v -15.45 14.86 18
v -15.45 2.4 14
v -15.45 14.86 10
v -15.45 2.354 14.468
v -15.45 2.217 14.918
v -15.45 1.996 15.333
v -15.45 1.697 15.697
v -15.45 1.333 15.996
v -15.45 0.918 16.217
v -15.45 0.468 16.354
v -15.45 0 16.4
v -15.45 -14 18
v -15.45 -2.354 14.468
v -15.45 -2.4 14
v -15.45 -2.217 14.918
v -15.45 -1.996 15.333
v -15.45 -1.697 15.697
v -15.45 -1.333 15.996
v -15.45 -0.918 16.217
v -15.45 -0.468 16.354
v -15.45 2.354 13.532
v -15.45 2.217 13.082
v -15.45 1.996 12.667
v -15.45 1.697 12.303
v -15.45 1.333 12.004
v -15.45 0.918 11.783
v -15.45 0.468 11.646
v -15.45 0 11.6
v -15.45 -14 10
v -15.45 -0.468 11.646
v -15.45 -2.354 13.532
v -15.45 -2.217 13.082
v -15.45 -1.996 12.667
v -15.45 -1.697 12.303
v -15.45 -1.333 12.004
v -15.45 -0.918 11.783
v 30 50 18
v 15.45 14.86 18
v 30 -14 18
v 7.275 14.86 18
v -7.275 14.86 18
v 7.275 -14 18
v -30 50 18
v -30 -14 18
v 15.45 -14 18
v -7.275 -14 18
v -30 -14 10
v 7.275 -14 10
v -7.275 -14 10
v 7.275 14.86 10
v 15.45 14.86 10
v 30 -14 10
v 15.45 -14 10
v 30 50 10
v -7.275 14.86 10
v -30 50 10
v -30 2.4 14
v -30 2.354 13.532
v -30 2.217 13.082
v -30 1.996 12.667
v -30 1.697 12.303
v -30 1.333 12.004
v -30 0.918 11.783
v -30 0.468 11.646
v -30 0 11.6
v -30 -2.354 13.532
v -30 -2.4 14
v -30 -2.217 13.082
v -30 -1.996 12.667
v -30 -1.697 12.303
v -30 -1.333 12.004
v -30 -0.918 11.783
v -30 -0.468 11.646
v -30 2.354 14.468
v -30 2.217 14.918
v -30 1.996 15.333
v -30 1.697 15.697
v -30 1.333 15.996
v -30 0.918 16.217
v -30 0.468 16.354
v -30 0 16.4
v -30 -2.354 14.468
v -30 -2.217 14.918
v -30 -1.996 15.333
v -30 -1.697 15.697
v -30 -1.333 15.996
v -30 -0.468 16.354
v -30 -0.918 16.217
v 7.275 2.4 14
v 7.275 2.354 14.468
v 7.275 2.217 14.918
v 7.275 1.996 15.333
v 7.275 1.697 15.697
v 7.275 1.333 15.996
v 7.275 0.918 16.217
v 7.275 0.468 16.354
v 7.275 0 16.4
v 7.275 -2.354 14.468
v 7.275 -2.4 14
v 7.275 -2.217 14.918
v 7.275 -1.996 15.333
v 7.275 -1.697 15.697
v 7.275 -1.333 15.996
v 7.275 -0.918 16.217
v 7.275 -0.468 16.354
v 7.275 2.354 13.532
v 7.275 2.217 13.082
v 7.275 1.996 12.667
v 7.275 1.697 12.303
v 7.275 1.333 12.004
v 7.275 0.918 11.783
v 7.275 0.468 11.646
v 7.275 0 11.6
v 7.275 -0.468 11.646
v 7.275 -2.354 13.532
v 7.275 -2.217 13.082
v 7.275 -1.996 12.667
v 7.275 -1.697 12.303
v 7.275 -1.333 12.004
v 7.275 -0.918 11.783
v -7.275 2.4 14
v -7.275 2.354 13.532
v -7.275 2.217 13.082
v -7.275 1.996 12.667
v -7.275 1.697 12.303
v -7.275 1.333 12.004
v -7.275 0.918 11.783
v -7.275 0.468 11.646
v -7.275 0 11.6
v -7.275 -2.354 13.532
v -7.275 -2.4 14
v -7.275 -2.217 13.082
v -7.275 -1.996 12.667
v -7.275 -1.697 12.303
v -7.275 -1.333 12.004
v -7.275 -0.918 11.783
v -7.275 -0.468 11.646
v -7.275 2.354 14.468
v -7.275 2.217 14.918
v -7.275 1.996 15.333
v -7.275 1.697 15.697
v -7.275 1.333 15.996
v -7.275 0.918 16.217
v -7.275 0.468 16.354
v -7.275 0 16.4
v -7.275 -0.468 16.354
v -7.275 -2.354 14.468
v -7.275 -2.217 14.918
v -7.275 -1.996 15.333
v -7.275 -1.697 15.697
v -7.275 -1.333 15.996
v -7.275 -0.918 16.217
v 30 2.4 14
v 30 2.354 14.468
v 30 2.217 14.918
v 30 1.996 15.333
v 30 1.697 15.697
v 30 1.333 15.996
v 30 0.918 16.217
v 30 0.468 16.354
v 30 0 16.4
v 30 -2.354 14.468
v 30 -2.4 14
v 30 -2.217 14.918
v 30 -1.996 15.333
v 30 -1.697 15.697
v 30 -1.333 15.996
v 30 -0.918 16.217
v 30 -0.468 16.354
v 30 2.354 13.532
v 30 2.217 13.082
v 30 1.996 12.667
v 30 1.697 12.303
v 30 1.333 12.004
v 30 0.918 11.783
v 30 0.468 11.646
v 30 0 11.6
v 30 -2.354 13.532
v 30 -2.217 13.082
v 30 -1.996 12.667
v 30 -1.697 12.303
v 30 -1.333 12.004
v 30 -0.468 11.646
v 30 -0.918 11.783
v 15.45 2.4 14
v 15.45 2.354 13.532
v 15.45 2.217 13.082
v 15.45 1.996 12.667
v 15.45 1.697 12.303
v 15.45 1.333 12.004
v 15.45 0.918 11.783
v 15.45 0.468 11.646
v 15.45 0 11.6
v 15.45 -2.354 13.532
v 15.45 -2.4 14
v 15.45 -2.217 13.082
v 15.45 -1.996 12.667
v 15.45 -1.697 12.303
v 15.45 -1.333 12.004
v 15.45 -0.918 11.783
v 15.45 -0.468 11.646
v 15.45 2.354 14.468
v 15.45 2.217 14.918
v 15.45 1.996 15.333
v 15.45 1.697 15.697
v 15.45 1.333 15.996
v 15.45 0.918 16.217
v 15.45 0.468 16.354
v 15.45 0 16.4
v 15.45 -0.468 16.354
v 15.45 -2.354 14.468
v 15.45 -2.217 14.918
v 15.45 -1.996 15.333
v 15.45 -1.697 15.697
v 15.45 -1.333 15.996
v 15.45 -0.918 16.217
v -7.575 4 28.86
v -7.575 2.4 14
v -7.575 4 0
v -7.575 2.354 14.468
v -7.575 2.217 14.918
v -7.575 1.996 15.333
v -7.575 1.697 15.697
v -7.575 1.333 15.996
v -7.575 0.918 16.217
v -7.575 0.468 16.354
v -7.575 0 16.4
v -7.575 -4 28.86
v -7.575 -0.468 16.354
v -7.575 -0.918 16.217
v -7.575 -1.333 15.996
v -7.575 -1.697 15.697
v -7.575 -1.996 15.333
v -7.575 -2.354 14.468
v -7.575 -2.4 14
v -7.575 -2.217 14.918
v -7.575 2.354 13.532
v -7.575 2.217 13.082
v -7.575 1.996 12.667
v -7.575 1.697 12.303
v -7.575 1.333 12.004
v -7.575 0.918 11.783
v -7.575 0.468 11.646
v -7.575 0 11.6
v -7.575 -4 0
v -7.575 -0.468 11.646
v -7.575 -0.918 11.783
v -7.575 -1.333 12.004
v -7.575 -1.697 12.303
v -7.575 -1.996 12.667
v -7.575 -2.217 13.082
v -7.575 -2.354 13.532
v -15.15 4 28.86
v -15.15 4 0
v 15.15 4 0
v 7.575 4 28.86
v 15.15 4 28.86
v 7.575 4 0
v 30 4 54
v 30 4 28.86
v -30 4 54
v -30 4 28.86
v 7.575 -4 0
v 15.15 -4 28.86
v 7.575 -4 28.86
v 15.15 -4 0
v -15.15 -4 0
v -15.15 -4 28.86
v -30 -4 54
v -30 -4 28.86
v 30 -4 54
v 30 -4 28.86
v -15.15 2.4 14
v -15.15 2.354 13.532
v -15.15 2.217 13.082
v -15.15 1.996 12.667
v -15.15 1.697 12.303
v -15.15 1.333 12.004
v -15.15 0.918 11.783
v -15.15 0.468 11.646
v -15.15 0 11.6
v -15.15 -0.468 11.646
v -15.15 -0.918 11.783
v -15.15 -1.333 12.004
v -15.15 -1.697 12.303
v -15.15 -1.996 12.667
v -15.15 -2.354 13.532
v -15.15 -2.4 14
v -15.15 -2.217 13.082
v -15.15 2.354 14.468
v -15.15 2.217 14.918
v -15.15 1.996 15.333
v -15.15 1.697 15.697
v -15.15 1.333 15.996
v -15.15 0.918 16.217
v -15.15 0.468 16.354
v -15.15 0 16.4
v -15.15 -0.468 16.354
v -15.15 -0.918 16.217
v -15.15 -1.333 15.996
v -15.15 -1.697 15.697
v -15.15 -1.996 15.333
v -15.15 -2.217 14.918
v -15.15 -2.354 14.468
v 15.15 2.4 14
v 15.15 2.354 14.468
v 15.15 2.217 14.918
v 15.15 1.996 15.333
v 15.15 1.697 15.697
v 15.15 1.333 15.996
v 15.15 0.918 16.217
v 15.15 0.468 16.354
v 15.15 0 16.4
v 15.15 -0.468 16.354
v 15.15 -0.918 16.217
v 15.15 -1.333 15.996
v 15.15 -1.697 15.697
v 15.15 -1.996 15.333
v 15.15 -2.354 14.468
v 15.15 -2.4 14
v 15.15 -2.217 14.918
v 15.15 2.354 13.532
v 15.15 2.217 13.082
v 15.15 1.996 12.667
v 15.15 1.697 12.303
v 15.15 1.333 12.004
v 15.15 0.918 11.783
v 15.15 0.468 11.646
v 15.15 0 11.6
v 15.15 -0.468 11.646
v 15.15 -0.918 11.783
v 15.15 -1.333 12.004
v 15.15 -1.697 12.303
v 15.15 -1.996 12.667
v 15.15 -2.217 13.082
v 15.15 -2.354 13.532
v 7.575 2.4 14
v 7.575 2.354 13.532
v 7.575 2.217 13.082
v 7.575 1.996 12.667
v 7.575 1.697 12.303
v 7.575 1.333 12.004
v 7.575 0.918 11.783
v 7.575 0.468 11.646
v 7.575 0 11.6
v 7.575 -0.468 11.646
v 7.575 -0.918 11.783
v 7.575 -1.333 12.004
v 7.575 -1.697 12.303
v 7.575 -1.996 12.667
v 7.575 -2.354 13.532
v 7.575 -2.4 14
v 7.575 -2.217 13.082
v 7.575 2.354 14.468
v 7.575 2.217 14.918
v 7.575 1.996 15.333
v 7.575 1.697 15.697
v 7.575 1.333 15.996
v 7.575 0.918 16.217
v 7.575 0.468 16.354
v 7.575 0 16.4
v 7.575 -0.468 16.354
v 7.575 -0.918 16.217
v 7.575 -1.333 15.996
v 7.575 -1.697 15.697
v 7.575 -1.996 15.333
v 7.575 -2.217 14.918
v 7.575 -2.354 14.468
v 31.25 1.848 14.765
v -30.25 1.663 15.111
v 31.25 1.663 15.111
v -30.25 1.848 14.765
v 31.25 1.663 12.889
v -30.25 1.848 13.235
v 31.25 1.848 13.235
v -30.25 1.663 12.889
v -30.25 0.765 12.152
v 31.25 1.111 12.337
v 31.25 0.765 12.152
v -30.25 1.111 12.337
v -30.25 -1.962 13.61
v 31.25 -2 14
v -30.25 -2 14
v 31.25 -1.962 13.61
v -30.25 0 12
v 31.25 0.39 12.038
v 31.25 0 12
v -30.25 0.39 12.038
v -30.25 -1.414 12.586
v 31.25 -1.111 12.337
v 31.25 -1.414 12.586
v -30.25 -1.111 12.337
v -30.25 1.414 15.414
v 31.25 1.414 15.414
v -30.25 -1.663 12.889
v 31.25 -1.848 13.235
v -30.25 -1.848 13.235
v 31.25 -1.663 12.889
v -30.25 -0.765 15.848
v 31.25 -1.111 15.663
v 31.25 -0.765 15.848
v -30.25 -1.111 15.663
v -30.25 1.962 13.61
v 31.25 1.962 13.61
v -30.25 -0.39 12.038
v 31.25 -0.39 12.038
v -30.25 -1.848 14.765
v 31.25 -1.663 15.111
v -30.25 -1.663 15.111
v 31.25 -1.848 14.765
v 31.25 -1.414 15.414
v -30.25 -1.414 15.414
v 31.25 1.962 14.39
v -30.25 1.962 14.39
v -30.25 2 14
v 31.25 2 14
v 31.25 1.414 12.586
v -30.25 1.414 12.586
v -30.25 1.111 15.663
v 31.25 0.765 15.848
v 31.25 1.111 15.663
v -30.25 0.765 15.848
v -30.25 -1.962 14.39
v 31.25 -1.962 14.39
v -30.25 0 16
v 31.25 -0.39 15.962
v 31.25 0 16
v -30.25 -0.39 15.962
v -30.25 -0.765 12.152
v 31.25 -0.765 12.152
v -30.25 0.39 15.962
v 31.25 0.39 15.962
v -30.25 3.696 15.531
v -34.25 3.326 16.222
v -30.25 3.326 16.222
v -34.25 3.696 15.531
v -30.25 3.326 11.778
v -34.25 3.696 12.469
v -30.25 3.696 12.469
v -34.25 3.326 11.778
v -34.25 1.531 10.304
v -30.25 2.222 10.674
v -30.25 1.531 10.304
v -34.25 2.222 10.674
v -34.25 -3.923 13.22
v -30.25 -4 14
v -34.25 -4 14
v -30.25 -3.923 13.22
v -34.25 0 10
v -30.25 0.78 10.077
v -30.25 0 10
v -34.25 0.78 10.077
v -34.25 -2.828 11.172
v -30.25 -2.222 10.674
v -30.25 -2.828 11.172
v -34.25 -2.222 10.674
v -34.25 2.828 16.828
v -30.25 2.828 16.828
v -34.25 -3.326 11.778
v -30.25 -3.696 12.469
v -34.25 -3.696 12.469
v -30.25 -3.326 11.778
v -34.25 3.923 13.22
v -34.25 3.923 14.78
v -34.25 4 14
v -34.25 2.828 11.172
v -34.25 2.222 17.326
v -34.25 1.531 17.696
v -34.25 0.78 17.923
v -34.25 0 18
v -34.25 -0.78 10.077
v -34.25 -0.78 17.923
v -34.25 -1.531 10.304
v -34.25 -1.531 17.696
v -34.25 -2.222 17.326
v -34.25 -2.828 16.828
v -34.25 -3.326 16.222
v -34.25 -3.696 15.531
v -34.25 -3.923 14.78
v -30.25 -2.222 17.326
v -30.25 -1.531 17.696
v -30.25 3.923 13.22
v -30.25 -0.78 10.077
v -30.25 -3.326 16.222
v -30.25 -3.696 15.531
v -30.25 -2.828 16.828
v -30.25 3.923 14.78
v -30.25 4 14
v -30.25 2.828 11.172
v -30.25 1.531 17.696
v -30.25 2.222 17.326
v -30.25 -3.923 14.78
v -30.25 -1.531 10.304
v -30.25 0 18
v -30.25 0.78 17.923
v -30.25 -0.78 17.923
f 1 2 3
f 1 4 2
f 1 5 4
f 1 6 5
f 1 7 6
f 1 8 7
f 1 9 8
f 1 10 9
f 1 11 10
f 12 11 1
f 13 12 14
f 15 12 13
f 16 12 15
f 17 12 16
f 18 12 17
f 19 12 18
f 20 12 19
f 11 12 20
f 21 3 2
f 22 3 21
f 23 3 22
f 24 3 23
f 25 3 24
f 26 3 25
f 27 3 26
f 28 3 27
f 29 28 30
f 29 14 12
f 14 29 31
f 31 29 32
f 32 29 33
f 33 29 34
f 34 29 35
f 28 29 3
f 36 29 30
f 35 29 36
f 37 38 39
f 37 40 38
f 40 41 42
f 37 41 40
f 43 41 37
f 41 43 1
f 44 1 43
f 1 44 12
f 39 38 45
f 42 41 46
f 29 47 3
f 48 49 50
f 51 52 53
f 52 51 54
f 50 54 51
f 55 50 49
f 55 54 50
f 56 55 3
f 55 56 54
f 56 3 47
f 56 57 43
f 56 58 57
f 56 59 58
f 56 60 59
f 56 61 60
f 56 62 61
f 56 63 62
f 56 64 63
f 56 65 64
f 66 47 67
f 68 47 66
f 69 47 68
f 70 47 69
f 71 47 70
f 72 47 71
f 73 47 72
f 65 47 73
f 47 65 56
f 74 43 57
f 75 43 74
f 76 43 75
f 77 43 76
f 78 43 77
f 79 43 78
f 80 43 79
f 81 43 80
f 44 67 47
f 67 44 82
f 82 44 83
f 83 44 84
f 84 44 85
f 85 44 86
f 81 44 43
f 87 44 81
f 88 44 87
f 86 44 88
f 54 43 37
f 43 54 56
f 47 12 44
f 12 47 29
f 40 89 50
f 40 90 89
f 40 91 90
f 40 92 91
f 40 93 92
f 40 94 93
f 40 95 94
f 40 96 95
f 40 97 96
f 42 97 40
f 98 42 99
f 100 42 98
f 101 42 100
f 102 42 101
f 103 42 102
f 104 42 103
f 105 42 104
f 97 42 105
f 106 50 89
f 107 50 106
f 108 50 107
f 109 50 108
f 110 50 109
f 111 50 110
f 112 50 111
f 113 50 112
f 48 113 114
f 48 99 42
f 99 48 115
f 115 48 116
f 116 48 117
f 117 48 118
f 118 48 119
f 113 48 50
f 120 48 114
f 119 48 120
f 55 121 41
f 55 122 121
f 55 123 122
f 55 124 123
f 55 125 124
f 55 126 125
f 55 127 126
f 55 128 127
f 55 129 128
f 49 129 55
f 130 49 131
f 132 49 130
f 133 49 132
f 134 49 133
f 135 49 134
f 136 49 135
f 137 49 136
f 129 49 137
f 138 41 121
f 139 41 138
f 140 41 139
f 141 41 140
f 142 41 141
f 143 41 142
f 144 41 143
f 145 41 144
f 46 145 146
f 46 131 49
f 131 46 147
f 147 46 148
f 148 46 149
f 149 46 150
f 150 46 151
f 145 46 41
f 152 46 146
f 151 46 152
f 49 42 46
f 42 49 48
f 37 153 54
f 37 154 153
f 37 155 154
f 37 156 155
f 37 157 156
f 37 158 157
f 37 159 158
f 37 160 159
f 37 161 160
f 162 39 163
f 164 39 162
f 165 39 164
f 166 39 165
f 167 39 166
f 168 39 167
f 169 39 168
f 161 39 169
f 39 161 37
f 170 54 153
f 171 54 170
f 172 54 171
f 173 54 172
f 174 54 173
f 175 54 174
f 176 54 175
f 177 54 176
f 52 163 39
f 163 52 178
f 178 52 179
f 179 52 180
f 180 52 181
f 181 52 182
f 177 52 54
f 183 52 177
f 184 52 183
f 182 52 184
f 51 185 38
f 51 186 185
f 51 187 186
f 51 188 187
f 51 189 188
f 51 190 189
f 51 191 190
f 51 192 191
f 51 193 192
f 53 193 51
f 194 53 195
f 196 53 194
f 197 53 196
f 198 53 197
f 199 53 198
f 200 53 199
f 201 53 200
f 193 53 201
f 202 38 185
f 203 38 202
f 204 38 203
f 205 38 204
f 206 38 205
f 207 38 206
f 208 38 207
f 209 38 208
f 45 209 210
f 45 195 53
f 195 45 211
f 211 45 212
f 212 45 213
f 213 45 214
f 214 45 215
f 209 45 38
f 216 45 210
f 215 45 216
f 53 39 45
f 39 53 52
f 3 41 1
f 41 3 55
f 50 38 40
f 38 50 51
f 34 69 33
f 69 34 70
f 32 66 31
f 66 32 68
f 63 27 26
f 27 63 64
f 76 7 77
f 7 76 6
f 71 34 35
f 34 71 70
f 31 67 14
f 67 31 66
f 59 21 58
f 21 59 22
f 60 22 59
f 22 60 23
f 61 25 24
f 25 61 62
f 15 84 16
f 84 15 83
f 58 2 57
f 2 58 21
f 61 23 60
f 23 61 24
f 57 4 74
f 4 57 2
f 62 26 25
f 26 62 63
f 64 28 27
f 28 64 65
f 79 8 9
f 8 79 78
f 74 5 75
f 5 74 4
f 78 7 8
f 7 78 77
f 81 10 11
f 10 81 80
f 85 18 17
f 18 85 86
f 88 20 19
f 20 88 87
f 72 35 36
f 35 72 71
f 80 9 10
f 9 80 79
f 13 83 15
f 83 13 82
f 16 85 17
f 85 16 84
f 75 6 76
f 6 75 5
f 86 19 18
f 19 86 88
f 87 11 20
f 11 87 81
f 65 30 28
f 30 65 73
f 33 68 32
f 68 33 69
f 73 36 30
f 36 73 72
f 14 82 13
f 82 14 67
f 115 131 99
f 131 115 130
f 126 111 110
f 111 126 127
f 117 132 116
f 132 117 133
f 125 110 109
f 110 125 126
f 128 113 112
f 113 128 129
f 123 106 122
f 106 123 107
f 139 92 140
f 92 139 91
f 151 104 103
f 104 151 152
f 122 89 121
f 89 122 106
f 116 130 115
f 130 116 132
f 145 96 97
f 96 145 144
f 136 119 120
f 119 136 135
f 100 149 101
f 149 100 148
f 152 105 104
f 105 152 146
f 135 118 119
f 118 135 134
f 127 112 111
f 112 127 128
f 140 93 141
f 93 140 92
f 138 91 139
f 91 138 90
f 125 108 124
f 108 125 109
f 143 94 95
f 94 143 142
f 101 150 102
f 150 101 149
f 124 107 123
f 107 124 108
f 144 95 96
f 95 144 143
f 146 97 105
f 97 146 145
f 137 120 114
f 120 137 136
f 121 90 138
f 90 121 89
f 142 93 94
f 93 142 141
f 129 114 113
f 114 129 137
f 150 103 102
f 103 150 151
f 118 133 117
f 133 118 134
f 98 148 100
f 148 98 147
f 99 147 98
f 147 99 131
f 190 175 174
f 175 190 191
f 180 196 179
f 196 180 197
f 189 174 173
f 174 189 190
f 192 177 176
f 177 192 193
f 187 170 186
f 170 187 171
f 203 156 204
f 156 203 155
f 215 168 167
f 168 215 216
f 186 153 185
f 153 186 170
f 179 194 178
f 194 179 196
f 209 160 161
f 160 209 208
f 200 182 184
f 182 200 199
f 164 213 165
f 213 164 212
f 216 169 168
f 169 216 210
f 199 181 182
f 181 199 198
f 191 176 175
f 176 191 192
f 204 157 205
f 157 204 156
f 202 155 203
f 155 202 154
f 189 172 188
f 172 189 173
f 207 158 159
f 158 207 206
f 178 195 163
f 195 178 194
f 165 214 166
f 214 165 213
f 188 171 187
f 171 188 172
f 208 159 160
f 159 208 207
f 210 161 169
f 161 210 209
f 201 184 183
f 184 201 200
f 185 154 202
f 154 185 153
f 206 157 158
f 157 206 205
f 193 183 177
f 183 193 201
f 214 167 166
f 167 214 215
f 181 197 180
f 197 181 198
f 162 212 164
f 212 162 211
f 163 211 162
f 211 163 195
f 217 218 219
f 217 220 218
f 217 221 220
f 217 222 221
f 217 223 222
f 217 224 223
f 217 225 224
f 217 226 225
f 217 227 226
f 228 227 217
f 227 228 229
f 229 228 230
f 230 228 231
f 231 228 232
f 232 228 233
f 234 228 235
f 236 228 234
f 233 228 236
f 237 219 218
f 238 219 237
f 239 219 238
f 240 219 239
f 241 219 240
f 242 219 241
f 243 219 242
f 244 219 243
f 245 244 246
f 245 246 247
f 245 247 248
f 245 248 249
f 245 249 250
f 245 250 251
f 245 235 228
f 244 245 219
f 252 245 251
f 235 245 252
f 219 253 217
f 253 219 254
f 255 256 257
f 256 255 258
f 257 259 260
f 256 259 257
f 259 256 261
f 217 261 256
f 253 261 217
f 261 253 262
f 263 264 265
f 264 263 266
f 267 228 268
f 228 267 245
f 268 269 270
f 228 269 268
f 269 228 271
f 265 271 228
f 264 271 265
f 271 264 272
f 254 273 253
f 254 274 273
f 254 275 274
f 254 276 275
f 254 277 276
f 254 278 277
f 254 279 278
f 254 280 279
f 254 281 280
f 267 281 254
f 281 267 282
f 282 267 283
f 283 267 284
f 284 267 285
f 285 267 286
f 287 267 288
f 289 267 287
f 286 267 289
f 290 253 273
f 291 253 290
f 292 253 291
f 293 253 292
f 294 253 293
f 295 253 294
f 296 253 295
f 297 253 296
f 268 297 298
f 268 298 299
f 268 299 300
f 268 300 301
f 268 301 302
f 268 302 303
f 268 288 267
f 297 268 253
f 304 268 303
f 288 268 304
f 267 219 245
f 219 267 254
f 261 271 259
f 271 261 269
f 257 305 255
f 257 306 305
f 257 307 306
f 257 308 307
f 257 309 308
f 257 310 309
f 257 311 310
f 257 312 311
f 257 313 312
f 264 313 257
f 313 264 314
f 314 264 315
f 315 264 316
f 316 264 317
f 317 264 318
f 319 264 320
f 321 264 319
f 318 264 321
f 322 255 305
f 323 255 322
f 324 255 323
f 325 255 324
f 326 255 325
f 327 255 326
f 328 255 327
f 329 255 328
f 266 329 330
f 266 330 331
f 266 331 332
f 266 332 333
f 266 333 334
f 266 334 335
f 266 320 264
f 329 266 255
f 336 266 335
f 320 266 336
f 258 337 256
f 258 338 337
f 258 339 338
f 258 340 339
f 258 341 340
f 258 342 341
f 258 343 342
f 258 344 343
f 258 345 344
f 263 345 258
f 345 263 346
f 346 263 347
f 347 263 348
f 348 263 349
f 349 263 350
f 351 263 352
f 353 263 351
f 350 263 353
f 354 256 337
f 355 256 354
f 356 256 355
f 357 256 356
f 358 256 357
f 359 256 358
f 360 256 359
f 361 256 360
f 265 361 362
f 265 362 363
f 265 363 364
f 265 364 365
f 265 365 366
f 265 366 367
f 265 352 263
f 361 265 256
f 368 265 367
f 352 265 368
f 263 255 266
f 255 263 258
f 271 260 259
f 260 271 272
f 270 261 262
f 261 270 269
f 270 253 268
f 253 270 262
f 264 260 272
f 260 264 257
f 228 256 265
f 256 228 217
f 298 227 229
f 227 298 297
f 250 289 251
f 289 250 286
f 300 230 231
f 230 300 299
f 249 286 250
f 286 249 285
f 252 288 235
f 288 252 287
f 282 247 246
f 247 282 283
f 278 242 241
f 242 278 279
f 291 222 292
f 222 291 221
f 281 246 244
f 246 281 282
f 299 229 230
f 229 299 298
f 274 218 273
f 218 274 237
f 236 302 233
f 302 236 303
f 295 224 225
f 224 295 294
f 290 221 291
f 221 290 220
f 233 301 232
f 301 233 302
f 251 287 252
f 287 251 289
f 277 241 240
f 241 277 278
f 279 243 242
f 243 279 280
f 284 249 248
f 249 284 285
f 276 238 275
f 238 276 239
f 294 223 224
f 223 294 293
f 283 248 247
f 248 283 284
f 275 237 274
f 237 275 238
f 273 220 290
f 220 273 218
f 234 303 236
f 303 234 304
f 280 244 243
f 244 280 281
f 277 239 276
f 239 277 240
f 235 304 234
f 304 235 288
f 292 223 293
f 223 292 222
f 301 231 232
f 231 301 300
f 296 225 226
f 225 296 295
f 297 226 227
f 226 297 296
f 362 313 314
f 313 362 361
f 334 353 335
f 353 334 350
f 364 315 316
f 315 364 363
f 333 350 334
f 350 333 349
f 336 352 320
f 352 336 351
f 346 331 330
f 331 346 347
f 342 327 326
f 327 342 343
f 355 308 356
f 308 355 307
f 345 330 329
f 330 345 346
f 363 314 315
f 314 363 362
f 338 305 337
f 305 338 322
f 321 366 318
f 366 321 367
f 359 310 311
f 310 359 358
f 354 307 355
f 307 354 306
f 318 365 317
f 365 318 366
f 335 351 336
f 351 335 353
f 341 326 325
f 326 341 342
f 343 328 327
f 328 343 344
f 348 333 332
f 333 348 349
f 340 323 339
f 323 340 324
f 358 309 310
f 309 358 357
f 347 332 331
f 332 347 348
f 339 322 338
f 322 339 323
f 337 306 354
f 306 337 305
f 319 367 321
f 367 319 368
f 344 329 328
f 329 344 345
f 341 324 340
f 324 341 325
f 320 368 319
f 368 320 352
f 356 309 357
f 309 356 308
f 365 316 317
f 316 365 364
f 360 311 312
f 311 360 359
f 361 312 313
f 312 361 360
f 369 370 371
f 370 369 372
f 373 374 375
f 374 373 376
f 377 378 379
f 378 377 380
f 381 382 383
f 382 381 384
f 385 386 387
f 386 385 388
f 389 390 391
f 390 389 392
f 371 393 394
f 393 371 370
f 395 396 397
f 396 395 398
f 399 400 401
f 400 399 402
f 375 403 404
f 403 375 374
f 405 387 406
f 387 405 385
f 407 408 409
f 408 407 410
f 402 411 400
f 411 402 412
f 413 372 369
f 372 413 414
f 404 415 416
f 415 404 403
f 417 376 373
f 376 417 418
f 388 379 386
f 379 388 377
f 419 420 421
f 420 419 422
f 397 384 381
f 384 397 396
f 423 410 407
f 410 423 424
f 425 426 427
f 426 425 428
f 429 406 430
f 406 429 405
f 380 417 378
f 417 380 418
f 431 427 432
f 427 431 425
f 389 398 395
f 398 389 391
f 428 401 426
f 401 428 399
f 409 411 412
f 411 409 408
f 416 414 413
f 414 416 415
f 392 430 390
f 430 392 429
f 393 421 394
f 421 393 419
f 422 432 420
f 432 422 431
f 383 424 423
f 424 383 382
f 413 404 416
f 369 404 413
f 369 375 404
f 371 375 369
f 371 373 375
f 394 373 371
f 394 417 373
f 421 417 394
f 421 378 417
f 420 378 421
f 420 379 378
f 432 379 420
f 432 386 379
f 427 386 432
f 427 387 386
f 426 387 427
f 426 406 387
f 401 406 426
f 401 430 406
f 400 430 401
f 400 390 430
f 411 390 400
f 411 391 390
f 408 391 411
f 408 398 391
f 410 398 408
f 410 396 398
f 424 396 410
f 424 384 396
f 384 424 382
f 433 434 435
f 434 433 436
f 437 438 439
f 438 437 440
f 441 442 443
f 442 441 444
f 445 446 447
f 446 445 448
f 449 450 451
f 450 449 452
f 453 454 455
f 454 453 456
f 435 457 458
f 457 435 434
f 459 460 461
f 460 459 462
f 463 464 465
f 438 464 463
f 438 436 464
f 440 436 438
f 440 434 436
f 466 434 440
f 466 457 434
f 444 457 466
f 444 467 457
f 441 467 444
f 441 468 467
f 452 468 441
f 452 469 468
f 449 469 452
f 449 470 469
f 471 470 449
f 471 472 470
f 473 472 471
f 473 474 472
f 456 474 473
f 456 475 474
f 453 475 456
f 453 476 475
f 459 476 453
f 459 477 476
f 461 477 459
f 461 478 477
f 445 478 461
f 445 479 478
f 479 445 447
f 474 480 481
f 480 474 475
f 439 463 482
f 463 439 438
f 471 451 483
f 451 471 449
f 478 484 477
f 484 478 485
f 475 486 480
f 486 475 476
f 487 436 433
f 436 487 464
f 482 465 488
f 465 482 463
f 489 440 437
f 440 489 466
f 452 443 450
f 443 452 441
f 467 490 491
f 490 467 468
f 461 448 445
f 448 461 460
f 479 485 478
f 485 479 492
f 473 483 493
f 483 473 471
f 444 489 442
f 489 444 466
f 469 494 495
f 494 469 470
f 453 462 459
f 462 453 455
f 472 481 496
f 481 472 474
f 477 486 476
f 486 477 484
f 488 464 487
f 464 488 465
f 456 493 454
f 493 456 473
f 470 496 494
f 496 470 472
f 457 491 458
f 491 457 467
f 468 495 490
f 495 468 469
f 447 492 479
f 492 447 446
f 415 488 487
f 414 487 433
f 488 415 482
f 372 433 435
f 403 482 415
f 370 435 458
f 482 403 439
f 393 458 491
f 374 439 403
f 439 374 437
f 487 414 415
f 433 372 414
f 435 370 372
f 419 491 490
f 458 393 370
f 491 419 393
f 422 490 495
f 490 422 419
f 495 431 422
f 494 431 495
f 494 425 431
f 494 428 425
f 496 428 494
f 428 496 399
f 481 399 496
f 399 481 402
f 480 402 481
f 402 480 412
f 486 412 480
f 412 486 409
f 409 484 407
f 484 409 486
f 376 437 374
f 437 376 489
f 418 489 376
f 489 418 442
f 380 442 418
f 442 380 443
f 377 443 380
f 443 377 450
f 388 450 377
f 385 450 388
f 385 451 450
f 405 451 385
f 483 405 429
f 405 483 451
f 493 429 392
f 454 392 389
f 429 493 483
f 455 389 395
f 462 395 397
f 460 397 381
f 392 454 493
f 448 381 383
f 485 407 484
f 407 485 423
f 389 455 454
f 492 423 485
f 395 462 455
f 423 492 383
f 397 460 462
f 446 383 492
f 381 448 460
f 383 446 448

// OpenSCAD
$fn = 32;

// ------------------------------------------------------------------------
// Butt hinge: hinge 60 mm, leaf swung 270 deg
// Every part is its own module, assembly() places every instance.
// ------------------------------------------------------------------------

// --- part 1 ---
module hinge_base() {
  difference() {
    union() {
      translate([-30, -14, -4]) cube([14.55, 64, 8]);
      translate([-7.275, -14, -4]) cube([14.55, 64, 8]);
      translate([15.45, -14, -4]) cube([14.55, 64, 8]);
      translate([-30, 14.86, -4]) cube([60, 35.14, 8]);
    }
    translate([-22.725, 0, 0]) rotate([0, 90, 0]) cylinder(h = 16.55, d = 4.8, center = true);
    translate([0, 0, 0]) rotate([0, 90, 0]) cylinder(h = 16.55, d = 4.8, center = true);
    translate([22.725, 0, 0]) rotate([0, 90, 0]) cylinder(h = 16.55, d = 4.8, center = true);
  }
}

// --- part 2 ---
module hinge_mover() {
  difference() {
    union() {
      translate([-15.15, -40, -4]) cube([7.575, 54, 8]);
      translate([7.575, -40, -4]) cube([7.575, 54, 8]);
      translate([-30, -40, -4]) cube([60, 25.14, 8]);
    }
    translate([-11.362, 0, 0]) rotate([0, 90, 0]) cylinder(h = 9.575, d = 4.8, center = true);
    translate([11.362, 0, 0]) rotate([0, 90, 0]) cylinder(h = 9.575, d = 4.8, center = true);
  }
}

// --- part 3 ---
module hinge_pin() {
  rotate([0, 90, 0]) cylinder(h = 62.5, d = 4, center = true);
  translate([-34.25, 0, 0]) rotate([0, 90, 0]) cylinder(h = 4, d = 8);
}

// --- assembly ---
module assembly() {
  color([0.80, 0.24, 0.20]) translate([0, 0, 14]) rotate([0, 0, 0]) hinge_base();
  color([0.20, 0.45, 0.75]) translate([0, 0, 14]) rotate([270, 0, 0]) hinge_mover();
  color([0.25, 0.62, 0.32]) translate([0, 0, 14]) rotate([0, 0, 0]) hinge_pin();
}

assembly();
